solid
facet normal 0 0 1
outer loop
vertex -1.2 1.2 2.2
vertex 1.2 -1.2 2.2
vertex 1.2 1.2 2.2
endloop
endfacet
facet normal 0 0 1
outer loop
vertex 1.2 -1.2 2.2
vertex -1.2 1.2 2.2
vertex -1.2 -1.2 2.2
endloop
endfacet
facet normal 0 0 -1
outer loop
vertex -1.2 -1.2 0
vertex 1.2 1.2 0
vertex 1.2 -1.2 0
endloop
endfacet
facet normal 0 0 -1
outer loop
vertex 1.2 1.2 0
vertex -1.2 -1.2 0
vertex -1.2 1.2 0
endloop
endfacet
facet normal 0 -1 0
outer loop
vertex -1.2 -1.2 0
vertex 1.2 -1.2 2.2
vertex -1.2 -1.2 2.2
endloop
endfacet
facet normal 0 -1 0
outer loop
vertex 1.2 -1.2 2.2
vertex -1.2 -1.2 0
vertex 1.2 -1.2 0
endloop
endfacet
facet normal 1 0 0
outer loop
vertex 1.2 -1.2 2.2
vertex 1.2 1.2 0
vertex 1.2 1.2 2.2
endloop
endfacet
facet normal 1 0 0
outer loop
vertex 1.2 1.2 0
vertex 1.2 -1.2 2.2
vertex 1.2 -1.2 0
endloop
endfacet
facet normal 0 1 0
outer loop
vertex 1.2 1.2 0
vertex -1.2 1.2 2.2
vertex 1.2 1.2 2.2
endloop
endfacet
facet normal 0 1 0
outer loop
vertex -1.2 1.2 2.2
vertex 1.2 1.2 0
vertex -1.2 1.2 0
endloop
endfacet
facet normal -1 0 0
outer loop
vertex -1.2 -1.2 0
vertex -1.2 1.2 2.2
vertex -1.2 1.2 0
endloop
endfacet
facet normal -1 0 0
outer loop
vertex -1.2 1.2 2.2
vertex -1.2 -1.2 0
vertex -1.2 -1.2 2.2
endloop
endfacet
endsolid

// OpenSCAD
// file: ../common/util.scad
// utility functions

module rotational_clone(clones=2) {
  for(i=[0:clones-1] ) {
    rotate([0,0,i * (360/clones)]) children();
  }
}
// file: ../settings.scad
/*
 *   Edit these settings to control the generated keycaps
 */

/* height of the part the finger rests on, doesn't exclude higher protrusions,
       eg. the saddle keycap rises on either side of the thumb for leverage */
effective_height=16+5;
//effective_height=11;

// maximum width in any direction, strict limit to prevent collision with adjacent keycaps
total_width=16;

// how thick the keycap, excluding the stem, should be. mostly aesthetic preference?
minimum_thickness = 1;


keycap_style = "trackpoint-lp";

/* can be auto (computationally expensive), manual (a bit janky, needs to be implemented for each keycap), or none.
     has no effect on certain keycaps such as trackpoint variants */
chamfer_style = "auto";

/* this allows you to rotate the keycap if the finger approaches at an angle
   you probably only want to rotate the Z-axis (third value) */
keycap_rotation = [0,0,0];


stem_model = "trackpoint-lp-clamp";


// "cr10 or "prusa" have presets, any other string will use a default tolerance, usually 0
printer = "prusa";

// slop factors for imprecision in the printing process
/*
vertical_slop = 0.1;
inner_slop = 0.4;
outer_slop = 0.2;
*/

/* -----------------------------------------------------------------------
 *  Do Not Edit - this machinery is consistent regardless of above values
 * -----------------------------------------------------------------------
 */

function auto_chamfer() = chamfer_style == "auto";

function manual_chamfer() = chamfer_style == "manual";
// file: trackpoint-lp.scad
/*
 *  A mount for a low profile Trackpoint rubber cap
 */

// ignores minimum_thickness, chamfer_style, etc so this isn't really needed atm
include <../settings.scad>;
use <../common/util.scad>

//$inner_slop_x = 0.0;
//$inner_slop_y = -0.0;
outer_slop = 0.1;
print_width = .4;
layer_height=.2;
first_layer=.2;

// it may vary somewhat, but the height of my rubber cap is 5mm
function height_offset() = 5;

side = 2.5;
raw_height=2.5;
function height(stem=true) = (stem?first_layer:0) + floor((raw_height-(stem?first_layer:0))/layer_height)*layer_height;

function adjusted_side_x(stem=true) = stem ? side + (is_undef($inner_slop_x) ? 0 : $inner_slop_x) : side - outer_slop;
function adjusted_side_y(stem=true) = stem ? side + (is_undef($inner_slop_y) ? 0 : $inner_slop_y) : side - outer_slop;
// this alias is for using when making a hole for a stem
module cap_tplp(stem=true) {
  //adjusted_side = adjusted_side();
  adjusted_height = height(stem) + (stem?0*layer_height:-layer_height);

  translate([0,0,adjusted_height/2]) cube([adjusted_side_x(stem=stem),adjusted_side_y(stem=stem),adjusted_height],true);
  if(stem) {
    let(inside=.2,outside=print_width,s=inside+outside) {
      translate([adjusted_side_x(stem=stem)/2-inside,adjusted_side_y(stem=stem)/2-inside,0]) cube([s,s,adjusted_height]);
      translate([-adjusted_side_x(stem=stem)/2-outside,-adjusted_side_y(stem=stem)/2-outside,0]) cube([s,s,adjusted_height]);
      translate([adjusted_side_x(stem=stem)/2-inside,-adjusted_side_y(stem=stem)/2-outside,0]) cube([s,s,adjusted_height]);
      translate([-adjusted_side_x(stem=stem)/2-outside,adjusted_side_y(stem=stem)/2-inside,0]) cube([s,s,adjusted_height]);
    }
  }
}

// this is for using as a cap
module cap() {
  cap_tplp(stem=false);
}

cap($fn=12);
// main file
include <trackpoint-lp.scad>

function height_offset() = 3.5;
